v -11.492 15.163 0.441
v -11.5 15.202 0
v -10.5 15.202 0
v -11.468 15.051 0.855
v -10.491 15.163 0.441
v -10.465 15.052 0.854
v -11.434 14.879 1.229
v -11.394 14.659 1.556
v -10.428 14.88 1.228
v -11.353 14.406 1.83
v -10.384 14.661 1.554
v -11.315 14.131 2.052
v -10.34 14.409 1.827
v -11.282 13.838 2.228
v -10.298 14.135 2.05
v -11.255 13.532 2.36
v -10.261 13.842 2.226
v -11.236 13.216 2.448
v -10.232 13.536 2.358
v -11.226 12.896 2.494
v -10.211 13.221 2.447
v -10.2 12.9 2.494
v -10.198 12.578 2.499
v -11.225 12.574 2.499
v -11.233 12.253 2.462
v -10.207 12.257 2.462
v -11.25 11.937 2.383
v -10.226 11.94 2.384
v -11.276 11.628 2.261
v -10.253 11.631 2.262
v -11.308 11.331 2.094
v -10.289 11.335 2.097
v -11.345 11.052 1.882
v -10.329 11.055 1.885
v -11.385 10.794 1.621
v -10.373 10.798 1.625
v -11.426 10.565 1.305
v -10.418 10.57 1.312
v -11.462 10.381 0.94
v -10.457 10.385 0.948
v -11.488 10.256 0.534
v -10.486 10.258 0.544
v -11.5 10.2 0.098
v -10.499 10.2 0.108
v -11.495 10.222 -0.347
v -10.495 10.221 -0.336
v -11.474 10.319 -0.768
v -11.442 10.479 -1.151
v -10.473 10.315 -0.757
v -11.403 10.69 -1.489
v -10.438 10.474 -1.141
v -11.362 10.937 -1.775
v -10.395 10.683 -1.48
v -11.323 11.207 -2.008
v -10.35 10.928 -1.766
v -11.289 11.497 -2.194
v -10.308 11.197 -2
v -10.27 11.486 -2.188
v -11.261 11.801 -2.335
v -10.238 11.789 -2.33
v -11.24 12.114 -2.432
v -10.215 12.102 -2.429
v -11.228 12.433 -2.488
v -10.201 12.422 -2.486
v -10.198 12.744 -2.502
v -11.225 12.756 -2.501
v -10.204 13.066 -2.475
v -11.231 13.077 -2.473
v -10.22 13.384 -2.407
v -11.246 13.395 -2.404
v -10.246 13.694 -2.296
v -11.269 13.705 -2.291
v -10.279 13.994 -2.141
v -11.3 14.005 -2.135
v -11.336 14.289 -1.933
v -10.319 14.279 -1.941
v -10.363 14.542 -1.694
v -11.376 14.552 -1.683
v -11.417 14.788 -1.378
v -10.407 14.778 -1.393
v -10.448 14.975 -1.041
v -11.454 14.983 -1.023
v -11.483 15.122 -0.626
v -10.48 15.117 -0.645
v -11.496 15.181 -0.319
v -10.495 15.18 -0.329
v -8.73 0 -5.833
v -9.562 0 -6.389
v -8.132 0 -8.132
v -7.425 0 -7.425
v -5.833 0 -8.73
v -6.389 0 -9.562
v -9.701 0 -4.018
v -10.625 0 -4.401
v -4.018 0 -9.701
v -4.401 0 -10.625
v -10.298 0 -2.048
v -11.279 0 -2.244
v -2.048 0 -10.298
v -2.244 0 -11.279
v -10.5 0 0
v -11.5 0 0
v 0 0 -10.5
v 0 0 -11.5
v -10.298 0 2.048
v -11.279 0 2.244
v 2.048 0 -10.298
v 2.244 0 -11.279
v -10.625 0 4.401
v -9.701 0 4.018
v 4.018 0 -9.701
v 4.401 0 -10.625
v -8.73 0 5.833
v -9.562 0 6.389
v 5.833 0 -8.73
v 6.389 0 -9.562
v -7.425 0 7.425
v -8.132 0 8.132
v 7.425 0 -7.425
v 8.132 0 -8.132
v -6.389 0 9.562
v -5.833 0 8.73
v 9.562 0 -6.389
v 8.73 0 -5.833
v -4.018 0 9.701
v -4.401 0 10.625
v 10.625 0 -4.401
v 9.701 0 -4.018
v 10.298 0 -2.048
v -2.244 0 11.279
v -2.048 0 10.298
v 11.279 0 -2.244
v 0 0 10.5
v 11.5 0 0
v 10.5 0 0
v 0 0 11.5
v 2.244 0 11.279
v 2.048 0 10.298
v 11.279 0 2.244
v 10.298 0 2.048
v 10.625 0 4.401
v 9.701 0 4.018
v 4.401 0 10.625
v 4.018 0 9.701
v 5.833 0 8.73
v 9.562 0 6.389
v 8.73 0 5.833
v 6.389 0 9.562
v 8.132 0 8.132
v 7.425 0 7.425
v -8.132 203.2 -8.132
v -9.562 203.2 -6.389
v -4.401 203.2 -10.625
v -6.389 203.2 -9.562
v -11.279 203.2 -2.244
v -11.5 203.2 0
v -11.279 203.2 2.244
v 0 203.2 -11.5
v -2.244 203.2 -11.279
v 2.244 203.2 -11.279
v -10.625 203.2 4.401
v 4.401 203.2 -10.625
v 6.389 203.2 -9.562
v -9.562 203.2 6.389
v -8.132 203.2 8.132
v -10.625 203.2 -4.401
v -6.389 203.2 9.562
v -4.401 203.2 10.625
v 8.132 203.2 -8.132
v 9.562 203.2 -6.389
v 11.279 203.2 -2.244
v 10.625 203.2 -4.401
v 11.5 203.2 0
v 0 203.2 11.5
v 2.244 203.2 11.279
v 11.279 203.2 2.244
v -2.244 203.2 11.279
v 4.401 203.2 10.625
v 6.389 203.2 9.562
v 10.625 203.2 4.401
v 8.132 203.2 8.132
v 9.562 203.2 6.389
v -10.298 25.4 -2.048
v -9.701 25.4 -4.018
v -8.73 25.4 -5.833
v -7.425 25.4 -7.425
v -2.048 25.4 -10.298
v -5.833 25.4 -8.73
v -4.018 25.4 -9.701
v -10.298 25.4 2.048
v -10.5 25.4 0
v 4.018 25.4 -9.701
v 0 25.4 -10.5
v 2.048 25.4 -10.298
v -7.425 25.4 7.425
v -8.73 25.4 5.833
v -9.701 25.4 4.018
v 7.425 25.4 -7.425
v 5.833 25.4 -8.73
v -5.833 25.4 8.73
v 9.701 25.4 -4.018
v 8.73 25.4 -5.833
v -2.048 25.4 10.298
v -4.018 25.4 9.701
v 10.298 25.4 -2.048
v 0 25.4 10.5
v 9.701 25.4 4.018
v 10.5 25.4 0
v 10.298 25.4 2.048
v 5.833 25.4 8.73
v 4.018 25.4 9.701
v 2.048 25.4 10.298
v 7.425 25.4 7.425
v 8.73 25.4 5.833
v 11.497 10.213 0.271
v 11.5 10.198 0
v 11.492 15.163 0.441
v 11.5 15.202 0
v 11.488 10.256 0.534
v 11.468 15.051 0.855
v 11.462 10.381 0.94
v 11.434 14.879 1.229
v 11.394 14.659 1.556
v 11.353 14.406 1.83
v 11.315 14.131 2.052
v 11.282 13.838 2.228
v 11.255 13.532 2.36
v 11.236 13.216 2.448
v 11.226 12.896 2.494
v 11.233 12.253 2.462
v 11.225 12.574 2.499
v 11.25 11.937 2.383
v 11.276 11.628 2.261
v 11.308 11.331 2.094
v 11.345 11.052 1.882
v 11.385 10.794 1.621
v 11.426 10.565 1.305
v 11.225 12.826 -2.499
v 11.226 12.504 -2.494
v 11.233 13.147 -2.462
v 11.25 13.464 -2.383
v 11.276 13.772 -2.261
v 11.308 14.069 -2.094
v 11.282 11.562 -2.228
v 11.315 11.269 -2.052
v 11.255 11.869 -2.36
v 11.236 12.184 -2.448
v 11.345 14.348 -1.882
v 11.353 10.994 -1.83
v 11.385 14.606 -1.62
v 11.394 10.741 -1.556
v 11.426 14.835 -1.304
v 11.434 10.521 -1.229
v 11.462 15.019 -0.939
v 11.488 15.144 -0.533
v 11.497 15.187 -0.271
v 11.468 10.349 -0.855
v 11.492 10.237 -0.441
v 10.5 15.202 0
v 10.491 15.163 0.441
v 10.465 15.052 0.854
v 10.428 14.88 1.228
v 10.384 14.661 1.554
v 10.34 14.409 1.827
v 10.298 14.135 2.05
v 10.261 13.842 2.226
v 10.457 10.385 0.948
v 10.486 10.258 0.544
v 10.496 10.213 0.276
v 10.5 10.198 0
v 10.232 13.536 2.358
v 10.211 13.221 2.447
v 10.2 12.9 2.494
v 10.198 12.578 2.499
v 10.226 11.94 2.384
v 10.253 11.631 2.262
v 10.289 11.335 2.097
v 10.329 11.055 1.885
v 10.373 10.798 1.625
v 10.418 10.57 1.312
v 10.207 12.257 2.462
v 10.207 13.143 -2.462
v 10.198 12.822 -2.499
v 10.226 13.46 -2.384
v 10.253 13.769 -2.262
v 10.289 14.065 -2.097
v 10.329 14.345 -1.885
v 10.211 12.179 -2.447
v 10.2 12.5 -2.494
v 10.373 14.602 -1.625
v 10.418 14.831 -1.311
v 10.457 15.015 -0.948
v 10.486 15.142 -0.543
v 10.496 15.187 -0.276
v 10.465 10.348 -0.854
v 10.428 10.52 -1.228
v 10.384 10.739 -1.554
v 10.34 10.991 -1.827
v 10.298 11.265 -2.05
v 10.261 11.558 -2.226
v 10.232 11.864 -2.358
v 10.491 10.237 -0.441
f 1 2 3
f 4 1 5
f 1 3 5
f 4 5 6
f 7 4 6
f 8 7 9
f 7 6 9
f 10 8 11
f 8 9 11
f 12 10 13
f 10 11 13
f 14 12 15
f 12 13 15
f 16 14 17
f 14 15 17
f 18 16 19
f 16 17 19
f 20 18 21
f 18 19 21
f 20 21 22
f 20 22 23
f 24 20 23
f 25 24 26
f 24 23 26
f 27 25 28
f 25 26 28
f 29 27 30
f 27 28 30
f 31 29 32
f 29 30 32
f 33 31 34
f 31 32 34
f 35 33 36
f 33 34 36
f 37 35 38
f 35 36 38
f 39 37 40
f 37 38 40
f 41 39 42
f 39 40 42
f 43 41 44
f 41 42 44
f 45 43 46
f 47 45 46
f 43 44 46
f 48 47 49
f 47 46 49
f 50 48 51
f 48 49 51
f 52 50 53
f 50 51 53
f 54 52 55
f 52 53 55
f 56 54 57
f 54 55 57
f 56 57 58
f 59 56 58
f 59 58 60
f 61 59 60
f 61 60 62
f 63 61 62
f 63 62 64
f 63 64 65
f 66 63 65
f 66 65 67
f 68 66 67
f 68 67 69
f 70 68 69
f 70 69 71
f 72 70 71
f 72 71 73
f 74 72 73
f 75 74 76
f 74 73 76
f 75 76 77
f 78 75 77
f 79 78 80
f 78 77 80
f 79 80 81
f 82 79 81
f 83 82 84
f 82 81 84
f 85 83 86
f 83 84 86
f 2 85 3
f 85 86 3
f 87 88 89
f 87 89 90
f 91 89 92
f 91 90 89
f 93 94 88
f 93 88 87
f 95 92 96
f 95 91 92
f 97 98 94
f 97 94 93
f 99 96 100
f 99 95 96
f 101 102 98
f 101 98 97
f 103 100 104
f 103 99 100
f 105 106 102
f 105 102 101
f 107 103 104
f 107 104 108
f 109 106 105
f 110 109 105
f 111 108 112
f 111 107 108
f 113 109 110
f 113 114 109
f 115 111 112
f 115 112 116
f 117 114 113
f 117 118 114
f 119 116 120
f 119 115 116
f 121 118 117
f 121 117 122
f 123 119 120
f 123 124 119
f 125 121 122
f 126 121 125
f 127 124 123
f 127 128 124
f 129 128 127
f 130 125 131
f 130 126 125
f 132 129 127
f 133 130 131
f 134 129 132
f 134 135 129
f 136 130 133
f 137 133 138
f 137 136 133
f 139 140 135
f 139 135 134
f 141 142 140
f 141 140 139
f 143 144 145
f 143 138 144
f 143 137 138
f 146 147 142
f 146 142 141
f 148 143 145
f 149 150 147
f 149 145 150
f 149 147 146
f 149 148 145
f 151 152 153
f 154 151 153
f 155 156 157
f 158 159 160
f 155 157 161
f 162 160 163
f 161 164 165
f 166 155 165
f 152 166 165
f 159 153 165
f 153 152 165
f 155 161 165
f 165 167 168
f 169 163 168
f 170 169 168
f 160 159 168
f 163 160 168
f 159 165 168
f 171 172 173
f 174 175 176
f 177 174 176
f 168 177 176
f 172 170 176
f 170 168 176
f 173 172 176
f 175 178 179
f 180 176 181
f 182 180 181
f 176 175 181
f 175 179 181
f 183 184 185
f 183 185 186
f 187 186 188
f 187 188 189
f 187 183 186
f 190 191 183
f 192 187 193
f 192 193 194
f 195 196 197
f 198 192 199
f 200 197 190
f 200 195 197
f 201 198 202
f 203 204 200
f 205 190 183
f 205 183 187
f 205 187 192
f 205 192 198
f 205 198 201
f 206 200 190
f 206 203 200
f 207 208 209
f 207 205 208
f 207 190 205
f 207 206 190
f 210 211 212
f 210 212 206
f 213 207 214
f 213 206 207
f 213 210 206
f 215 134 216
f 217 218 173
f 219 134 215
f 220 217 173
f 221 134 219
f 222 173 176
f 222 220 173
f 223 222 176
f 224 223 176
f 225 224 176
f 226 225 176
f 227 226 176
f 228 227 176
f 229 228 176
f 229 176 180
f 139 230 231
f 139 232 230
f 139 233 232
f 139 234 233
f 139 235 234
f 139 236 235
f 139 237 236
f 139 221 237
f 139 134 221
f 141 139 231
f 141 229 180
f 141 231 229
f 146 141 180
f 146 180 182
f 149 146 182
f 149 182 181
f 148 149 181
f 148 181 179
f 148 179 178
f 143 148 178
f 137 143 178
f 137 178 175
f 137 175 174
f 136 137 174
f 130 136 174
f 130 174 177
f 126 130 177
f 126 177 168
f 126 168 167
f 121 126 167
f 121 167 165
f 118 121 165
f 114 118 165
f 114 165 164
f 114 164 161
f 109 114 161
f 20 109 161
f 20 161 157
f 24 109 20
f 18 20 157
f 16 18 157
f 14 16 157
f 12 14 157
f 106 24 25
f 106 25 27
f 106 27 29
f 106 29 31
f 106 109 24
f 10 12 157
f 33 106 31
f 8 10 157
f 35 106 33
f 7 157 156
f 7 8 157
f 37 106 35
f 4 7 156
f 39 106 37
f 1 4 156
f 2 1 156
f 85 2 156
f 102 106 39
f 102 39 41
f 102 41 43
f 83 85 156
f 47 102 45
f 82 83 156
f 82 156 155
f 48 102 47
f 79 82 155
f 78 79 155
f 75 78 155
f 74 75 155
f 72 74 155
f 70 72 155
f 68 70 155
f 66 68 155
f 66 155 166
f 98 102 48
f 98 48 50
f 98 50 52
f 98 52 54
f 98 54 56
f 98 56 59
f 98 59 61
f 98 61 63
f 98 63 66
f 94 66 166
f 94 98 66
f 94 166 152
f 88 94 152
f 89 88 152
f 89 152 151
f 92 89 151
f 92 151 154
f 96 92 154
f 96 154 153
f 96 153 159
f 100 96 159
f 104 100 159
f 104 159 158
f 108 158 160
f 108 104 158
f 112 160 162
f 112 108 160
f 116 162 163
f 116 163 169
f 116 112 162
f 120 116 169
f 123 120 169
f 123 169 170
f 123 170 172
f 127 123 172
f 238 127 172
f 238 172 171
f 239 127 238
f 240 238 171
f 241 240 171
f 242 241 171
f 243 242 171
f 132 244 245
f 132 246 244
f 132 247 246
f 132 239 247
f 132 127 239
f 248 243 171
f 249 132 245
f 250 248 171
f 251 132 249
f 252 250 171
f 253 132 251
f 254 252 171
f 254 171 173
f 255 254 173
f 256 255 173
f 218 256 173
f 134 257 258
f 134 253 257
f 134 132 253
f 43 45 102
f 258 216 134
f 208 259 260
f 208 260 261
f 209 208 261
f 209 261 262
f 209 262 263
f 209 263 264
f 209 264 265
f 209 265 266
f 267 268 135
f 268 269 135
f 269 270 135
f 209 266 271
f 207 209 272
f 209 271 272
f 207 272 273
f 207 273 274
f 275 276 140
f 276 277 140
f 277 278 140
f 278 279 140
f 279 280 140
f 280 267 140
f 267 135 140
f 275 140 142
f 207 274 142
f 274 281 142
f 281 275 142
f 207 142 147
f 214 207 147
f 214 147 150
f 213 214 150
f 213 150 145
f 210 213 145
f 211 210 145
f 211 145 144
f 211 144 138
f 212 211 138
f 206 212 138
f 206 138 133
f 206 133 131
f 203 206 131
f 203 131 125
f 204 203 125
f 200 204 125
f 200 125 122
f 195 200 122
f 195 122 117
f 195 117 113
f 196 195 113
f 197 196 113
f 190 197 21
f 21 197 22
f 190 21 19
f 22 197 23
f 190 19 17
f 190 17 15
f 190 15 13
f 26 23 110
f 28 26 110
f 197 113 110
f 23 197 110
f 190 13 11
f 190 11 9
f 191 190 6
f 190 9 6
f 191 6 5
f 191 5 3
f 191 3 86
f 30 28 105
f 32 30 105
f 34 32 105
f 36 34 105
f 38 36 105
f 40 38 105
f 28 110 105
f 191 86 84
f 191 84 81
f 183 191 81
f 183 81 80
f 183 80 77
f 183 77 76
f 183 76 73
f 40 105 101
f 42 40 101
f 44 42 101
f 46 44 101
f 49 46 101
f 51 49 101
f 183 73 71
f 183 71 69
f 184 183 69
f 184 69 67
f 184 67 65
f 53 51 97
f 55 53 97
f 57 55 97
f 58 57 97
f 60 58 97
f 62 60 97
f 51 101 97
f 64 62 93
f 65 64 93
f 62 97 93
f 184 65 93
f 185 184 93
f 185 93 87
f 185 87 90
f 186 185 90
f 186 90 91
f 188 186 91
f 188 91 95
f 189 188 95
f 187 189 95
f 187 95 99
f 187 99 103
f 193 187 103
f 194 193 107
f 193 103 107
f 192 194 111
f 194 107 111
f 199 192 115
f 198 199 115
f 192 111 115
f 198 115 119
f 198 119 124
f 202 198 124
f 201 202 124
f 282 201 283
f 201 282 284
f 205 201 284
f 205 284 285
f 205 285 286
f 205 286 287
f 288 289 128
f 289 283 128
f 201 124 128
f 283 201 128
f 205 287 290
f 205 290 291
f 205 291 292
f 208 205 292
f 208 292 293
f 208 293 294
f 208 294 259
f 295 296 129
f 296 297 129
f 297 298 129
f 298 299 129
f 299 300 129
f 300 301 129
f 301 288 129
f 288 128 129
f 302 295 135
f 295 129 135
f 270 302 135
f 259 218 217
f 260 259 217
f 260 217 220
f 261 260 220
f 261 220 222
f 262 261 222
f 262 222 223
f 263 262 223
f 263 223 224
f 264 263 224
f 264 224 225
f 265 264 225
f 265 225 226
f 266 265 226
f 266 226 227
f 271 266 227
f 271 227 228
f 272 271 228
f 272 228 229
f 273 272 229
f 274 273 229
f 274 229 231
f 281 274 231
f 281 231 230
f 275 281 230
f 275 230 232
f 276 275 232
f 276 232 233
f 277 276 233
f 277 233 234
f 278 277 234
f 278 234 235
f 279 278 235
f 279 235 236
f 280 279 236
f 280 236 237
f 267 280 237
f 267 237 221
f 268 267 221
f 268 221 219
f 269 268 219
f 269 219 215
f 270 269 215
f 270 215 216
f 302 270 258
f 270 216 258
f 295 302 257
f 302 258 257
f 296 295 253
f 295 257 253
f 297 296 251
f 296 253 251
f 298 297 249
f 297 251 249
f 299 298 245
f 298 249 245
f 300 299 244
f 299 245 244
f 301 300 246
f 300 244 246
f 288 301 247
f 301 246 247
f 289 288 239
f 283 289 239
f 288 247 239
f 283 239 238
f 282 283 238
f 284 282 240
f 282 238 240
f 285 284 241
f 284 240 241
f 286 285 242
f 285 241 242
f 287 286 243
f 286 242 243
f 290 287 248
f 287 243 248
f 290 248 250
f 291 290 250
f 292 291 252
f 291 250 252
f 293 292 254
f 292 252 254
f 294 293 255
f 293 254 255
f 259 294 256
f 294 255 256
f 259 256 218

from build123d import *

# Parameters (mm, degrees)
F0_R     = 11.5
F0_R_2   = 10.5
F1_DEPTH = 203.2
F2_DEPTH = 25.4
F3_R     = 2.5019
F4_DEPTH = 12.7


with BuildPart() as f1:
    # F0 (on Front) → F1 (new body)
    with BuildSketch(Plane.XZ):
        Circle(F0_R)
        Circle(F0_R_2, mode=Mode.SUBTRACT)
        Circle(F0_R_2)
    extrude(amount=-F1_DEPTH)

    # F0 (on Front) → F2 (cut)
    with BuildSketch(Plane.XZ):
        Circle(F0_R_2)
    extrude(amount=-F2_DEPTH, mode=Mode.SUBTRACT)

    # F3 (on Right) → F4 (cut, symmetric)
    with BuildSketch(Plane.YZ):
        with Locations((12.7, 0)):
            Circle(F3_R)
    extrude(amount=F4_DEPTH, both=True, mode=Mode.SUBTRACT)


solid = f1.part
